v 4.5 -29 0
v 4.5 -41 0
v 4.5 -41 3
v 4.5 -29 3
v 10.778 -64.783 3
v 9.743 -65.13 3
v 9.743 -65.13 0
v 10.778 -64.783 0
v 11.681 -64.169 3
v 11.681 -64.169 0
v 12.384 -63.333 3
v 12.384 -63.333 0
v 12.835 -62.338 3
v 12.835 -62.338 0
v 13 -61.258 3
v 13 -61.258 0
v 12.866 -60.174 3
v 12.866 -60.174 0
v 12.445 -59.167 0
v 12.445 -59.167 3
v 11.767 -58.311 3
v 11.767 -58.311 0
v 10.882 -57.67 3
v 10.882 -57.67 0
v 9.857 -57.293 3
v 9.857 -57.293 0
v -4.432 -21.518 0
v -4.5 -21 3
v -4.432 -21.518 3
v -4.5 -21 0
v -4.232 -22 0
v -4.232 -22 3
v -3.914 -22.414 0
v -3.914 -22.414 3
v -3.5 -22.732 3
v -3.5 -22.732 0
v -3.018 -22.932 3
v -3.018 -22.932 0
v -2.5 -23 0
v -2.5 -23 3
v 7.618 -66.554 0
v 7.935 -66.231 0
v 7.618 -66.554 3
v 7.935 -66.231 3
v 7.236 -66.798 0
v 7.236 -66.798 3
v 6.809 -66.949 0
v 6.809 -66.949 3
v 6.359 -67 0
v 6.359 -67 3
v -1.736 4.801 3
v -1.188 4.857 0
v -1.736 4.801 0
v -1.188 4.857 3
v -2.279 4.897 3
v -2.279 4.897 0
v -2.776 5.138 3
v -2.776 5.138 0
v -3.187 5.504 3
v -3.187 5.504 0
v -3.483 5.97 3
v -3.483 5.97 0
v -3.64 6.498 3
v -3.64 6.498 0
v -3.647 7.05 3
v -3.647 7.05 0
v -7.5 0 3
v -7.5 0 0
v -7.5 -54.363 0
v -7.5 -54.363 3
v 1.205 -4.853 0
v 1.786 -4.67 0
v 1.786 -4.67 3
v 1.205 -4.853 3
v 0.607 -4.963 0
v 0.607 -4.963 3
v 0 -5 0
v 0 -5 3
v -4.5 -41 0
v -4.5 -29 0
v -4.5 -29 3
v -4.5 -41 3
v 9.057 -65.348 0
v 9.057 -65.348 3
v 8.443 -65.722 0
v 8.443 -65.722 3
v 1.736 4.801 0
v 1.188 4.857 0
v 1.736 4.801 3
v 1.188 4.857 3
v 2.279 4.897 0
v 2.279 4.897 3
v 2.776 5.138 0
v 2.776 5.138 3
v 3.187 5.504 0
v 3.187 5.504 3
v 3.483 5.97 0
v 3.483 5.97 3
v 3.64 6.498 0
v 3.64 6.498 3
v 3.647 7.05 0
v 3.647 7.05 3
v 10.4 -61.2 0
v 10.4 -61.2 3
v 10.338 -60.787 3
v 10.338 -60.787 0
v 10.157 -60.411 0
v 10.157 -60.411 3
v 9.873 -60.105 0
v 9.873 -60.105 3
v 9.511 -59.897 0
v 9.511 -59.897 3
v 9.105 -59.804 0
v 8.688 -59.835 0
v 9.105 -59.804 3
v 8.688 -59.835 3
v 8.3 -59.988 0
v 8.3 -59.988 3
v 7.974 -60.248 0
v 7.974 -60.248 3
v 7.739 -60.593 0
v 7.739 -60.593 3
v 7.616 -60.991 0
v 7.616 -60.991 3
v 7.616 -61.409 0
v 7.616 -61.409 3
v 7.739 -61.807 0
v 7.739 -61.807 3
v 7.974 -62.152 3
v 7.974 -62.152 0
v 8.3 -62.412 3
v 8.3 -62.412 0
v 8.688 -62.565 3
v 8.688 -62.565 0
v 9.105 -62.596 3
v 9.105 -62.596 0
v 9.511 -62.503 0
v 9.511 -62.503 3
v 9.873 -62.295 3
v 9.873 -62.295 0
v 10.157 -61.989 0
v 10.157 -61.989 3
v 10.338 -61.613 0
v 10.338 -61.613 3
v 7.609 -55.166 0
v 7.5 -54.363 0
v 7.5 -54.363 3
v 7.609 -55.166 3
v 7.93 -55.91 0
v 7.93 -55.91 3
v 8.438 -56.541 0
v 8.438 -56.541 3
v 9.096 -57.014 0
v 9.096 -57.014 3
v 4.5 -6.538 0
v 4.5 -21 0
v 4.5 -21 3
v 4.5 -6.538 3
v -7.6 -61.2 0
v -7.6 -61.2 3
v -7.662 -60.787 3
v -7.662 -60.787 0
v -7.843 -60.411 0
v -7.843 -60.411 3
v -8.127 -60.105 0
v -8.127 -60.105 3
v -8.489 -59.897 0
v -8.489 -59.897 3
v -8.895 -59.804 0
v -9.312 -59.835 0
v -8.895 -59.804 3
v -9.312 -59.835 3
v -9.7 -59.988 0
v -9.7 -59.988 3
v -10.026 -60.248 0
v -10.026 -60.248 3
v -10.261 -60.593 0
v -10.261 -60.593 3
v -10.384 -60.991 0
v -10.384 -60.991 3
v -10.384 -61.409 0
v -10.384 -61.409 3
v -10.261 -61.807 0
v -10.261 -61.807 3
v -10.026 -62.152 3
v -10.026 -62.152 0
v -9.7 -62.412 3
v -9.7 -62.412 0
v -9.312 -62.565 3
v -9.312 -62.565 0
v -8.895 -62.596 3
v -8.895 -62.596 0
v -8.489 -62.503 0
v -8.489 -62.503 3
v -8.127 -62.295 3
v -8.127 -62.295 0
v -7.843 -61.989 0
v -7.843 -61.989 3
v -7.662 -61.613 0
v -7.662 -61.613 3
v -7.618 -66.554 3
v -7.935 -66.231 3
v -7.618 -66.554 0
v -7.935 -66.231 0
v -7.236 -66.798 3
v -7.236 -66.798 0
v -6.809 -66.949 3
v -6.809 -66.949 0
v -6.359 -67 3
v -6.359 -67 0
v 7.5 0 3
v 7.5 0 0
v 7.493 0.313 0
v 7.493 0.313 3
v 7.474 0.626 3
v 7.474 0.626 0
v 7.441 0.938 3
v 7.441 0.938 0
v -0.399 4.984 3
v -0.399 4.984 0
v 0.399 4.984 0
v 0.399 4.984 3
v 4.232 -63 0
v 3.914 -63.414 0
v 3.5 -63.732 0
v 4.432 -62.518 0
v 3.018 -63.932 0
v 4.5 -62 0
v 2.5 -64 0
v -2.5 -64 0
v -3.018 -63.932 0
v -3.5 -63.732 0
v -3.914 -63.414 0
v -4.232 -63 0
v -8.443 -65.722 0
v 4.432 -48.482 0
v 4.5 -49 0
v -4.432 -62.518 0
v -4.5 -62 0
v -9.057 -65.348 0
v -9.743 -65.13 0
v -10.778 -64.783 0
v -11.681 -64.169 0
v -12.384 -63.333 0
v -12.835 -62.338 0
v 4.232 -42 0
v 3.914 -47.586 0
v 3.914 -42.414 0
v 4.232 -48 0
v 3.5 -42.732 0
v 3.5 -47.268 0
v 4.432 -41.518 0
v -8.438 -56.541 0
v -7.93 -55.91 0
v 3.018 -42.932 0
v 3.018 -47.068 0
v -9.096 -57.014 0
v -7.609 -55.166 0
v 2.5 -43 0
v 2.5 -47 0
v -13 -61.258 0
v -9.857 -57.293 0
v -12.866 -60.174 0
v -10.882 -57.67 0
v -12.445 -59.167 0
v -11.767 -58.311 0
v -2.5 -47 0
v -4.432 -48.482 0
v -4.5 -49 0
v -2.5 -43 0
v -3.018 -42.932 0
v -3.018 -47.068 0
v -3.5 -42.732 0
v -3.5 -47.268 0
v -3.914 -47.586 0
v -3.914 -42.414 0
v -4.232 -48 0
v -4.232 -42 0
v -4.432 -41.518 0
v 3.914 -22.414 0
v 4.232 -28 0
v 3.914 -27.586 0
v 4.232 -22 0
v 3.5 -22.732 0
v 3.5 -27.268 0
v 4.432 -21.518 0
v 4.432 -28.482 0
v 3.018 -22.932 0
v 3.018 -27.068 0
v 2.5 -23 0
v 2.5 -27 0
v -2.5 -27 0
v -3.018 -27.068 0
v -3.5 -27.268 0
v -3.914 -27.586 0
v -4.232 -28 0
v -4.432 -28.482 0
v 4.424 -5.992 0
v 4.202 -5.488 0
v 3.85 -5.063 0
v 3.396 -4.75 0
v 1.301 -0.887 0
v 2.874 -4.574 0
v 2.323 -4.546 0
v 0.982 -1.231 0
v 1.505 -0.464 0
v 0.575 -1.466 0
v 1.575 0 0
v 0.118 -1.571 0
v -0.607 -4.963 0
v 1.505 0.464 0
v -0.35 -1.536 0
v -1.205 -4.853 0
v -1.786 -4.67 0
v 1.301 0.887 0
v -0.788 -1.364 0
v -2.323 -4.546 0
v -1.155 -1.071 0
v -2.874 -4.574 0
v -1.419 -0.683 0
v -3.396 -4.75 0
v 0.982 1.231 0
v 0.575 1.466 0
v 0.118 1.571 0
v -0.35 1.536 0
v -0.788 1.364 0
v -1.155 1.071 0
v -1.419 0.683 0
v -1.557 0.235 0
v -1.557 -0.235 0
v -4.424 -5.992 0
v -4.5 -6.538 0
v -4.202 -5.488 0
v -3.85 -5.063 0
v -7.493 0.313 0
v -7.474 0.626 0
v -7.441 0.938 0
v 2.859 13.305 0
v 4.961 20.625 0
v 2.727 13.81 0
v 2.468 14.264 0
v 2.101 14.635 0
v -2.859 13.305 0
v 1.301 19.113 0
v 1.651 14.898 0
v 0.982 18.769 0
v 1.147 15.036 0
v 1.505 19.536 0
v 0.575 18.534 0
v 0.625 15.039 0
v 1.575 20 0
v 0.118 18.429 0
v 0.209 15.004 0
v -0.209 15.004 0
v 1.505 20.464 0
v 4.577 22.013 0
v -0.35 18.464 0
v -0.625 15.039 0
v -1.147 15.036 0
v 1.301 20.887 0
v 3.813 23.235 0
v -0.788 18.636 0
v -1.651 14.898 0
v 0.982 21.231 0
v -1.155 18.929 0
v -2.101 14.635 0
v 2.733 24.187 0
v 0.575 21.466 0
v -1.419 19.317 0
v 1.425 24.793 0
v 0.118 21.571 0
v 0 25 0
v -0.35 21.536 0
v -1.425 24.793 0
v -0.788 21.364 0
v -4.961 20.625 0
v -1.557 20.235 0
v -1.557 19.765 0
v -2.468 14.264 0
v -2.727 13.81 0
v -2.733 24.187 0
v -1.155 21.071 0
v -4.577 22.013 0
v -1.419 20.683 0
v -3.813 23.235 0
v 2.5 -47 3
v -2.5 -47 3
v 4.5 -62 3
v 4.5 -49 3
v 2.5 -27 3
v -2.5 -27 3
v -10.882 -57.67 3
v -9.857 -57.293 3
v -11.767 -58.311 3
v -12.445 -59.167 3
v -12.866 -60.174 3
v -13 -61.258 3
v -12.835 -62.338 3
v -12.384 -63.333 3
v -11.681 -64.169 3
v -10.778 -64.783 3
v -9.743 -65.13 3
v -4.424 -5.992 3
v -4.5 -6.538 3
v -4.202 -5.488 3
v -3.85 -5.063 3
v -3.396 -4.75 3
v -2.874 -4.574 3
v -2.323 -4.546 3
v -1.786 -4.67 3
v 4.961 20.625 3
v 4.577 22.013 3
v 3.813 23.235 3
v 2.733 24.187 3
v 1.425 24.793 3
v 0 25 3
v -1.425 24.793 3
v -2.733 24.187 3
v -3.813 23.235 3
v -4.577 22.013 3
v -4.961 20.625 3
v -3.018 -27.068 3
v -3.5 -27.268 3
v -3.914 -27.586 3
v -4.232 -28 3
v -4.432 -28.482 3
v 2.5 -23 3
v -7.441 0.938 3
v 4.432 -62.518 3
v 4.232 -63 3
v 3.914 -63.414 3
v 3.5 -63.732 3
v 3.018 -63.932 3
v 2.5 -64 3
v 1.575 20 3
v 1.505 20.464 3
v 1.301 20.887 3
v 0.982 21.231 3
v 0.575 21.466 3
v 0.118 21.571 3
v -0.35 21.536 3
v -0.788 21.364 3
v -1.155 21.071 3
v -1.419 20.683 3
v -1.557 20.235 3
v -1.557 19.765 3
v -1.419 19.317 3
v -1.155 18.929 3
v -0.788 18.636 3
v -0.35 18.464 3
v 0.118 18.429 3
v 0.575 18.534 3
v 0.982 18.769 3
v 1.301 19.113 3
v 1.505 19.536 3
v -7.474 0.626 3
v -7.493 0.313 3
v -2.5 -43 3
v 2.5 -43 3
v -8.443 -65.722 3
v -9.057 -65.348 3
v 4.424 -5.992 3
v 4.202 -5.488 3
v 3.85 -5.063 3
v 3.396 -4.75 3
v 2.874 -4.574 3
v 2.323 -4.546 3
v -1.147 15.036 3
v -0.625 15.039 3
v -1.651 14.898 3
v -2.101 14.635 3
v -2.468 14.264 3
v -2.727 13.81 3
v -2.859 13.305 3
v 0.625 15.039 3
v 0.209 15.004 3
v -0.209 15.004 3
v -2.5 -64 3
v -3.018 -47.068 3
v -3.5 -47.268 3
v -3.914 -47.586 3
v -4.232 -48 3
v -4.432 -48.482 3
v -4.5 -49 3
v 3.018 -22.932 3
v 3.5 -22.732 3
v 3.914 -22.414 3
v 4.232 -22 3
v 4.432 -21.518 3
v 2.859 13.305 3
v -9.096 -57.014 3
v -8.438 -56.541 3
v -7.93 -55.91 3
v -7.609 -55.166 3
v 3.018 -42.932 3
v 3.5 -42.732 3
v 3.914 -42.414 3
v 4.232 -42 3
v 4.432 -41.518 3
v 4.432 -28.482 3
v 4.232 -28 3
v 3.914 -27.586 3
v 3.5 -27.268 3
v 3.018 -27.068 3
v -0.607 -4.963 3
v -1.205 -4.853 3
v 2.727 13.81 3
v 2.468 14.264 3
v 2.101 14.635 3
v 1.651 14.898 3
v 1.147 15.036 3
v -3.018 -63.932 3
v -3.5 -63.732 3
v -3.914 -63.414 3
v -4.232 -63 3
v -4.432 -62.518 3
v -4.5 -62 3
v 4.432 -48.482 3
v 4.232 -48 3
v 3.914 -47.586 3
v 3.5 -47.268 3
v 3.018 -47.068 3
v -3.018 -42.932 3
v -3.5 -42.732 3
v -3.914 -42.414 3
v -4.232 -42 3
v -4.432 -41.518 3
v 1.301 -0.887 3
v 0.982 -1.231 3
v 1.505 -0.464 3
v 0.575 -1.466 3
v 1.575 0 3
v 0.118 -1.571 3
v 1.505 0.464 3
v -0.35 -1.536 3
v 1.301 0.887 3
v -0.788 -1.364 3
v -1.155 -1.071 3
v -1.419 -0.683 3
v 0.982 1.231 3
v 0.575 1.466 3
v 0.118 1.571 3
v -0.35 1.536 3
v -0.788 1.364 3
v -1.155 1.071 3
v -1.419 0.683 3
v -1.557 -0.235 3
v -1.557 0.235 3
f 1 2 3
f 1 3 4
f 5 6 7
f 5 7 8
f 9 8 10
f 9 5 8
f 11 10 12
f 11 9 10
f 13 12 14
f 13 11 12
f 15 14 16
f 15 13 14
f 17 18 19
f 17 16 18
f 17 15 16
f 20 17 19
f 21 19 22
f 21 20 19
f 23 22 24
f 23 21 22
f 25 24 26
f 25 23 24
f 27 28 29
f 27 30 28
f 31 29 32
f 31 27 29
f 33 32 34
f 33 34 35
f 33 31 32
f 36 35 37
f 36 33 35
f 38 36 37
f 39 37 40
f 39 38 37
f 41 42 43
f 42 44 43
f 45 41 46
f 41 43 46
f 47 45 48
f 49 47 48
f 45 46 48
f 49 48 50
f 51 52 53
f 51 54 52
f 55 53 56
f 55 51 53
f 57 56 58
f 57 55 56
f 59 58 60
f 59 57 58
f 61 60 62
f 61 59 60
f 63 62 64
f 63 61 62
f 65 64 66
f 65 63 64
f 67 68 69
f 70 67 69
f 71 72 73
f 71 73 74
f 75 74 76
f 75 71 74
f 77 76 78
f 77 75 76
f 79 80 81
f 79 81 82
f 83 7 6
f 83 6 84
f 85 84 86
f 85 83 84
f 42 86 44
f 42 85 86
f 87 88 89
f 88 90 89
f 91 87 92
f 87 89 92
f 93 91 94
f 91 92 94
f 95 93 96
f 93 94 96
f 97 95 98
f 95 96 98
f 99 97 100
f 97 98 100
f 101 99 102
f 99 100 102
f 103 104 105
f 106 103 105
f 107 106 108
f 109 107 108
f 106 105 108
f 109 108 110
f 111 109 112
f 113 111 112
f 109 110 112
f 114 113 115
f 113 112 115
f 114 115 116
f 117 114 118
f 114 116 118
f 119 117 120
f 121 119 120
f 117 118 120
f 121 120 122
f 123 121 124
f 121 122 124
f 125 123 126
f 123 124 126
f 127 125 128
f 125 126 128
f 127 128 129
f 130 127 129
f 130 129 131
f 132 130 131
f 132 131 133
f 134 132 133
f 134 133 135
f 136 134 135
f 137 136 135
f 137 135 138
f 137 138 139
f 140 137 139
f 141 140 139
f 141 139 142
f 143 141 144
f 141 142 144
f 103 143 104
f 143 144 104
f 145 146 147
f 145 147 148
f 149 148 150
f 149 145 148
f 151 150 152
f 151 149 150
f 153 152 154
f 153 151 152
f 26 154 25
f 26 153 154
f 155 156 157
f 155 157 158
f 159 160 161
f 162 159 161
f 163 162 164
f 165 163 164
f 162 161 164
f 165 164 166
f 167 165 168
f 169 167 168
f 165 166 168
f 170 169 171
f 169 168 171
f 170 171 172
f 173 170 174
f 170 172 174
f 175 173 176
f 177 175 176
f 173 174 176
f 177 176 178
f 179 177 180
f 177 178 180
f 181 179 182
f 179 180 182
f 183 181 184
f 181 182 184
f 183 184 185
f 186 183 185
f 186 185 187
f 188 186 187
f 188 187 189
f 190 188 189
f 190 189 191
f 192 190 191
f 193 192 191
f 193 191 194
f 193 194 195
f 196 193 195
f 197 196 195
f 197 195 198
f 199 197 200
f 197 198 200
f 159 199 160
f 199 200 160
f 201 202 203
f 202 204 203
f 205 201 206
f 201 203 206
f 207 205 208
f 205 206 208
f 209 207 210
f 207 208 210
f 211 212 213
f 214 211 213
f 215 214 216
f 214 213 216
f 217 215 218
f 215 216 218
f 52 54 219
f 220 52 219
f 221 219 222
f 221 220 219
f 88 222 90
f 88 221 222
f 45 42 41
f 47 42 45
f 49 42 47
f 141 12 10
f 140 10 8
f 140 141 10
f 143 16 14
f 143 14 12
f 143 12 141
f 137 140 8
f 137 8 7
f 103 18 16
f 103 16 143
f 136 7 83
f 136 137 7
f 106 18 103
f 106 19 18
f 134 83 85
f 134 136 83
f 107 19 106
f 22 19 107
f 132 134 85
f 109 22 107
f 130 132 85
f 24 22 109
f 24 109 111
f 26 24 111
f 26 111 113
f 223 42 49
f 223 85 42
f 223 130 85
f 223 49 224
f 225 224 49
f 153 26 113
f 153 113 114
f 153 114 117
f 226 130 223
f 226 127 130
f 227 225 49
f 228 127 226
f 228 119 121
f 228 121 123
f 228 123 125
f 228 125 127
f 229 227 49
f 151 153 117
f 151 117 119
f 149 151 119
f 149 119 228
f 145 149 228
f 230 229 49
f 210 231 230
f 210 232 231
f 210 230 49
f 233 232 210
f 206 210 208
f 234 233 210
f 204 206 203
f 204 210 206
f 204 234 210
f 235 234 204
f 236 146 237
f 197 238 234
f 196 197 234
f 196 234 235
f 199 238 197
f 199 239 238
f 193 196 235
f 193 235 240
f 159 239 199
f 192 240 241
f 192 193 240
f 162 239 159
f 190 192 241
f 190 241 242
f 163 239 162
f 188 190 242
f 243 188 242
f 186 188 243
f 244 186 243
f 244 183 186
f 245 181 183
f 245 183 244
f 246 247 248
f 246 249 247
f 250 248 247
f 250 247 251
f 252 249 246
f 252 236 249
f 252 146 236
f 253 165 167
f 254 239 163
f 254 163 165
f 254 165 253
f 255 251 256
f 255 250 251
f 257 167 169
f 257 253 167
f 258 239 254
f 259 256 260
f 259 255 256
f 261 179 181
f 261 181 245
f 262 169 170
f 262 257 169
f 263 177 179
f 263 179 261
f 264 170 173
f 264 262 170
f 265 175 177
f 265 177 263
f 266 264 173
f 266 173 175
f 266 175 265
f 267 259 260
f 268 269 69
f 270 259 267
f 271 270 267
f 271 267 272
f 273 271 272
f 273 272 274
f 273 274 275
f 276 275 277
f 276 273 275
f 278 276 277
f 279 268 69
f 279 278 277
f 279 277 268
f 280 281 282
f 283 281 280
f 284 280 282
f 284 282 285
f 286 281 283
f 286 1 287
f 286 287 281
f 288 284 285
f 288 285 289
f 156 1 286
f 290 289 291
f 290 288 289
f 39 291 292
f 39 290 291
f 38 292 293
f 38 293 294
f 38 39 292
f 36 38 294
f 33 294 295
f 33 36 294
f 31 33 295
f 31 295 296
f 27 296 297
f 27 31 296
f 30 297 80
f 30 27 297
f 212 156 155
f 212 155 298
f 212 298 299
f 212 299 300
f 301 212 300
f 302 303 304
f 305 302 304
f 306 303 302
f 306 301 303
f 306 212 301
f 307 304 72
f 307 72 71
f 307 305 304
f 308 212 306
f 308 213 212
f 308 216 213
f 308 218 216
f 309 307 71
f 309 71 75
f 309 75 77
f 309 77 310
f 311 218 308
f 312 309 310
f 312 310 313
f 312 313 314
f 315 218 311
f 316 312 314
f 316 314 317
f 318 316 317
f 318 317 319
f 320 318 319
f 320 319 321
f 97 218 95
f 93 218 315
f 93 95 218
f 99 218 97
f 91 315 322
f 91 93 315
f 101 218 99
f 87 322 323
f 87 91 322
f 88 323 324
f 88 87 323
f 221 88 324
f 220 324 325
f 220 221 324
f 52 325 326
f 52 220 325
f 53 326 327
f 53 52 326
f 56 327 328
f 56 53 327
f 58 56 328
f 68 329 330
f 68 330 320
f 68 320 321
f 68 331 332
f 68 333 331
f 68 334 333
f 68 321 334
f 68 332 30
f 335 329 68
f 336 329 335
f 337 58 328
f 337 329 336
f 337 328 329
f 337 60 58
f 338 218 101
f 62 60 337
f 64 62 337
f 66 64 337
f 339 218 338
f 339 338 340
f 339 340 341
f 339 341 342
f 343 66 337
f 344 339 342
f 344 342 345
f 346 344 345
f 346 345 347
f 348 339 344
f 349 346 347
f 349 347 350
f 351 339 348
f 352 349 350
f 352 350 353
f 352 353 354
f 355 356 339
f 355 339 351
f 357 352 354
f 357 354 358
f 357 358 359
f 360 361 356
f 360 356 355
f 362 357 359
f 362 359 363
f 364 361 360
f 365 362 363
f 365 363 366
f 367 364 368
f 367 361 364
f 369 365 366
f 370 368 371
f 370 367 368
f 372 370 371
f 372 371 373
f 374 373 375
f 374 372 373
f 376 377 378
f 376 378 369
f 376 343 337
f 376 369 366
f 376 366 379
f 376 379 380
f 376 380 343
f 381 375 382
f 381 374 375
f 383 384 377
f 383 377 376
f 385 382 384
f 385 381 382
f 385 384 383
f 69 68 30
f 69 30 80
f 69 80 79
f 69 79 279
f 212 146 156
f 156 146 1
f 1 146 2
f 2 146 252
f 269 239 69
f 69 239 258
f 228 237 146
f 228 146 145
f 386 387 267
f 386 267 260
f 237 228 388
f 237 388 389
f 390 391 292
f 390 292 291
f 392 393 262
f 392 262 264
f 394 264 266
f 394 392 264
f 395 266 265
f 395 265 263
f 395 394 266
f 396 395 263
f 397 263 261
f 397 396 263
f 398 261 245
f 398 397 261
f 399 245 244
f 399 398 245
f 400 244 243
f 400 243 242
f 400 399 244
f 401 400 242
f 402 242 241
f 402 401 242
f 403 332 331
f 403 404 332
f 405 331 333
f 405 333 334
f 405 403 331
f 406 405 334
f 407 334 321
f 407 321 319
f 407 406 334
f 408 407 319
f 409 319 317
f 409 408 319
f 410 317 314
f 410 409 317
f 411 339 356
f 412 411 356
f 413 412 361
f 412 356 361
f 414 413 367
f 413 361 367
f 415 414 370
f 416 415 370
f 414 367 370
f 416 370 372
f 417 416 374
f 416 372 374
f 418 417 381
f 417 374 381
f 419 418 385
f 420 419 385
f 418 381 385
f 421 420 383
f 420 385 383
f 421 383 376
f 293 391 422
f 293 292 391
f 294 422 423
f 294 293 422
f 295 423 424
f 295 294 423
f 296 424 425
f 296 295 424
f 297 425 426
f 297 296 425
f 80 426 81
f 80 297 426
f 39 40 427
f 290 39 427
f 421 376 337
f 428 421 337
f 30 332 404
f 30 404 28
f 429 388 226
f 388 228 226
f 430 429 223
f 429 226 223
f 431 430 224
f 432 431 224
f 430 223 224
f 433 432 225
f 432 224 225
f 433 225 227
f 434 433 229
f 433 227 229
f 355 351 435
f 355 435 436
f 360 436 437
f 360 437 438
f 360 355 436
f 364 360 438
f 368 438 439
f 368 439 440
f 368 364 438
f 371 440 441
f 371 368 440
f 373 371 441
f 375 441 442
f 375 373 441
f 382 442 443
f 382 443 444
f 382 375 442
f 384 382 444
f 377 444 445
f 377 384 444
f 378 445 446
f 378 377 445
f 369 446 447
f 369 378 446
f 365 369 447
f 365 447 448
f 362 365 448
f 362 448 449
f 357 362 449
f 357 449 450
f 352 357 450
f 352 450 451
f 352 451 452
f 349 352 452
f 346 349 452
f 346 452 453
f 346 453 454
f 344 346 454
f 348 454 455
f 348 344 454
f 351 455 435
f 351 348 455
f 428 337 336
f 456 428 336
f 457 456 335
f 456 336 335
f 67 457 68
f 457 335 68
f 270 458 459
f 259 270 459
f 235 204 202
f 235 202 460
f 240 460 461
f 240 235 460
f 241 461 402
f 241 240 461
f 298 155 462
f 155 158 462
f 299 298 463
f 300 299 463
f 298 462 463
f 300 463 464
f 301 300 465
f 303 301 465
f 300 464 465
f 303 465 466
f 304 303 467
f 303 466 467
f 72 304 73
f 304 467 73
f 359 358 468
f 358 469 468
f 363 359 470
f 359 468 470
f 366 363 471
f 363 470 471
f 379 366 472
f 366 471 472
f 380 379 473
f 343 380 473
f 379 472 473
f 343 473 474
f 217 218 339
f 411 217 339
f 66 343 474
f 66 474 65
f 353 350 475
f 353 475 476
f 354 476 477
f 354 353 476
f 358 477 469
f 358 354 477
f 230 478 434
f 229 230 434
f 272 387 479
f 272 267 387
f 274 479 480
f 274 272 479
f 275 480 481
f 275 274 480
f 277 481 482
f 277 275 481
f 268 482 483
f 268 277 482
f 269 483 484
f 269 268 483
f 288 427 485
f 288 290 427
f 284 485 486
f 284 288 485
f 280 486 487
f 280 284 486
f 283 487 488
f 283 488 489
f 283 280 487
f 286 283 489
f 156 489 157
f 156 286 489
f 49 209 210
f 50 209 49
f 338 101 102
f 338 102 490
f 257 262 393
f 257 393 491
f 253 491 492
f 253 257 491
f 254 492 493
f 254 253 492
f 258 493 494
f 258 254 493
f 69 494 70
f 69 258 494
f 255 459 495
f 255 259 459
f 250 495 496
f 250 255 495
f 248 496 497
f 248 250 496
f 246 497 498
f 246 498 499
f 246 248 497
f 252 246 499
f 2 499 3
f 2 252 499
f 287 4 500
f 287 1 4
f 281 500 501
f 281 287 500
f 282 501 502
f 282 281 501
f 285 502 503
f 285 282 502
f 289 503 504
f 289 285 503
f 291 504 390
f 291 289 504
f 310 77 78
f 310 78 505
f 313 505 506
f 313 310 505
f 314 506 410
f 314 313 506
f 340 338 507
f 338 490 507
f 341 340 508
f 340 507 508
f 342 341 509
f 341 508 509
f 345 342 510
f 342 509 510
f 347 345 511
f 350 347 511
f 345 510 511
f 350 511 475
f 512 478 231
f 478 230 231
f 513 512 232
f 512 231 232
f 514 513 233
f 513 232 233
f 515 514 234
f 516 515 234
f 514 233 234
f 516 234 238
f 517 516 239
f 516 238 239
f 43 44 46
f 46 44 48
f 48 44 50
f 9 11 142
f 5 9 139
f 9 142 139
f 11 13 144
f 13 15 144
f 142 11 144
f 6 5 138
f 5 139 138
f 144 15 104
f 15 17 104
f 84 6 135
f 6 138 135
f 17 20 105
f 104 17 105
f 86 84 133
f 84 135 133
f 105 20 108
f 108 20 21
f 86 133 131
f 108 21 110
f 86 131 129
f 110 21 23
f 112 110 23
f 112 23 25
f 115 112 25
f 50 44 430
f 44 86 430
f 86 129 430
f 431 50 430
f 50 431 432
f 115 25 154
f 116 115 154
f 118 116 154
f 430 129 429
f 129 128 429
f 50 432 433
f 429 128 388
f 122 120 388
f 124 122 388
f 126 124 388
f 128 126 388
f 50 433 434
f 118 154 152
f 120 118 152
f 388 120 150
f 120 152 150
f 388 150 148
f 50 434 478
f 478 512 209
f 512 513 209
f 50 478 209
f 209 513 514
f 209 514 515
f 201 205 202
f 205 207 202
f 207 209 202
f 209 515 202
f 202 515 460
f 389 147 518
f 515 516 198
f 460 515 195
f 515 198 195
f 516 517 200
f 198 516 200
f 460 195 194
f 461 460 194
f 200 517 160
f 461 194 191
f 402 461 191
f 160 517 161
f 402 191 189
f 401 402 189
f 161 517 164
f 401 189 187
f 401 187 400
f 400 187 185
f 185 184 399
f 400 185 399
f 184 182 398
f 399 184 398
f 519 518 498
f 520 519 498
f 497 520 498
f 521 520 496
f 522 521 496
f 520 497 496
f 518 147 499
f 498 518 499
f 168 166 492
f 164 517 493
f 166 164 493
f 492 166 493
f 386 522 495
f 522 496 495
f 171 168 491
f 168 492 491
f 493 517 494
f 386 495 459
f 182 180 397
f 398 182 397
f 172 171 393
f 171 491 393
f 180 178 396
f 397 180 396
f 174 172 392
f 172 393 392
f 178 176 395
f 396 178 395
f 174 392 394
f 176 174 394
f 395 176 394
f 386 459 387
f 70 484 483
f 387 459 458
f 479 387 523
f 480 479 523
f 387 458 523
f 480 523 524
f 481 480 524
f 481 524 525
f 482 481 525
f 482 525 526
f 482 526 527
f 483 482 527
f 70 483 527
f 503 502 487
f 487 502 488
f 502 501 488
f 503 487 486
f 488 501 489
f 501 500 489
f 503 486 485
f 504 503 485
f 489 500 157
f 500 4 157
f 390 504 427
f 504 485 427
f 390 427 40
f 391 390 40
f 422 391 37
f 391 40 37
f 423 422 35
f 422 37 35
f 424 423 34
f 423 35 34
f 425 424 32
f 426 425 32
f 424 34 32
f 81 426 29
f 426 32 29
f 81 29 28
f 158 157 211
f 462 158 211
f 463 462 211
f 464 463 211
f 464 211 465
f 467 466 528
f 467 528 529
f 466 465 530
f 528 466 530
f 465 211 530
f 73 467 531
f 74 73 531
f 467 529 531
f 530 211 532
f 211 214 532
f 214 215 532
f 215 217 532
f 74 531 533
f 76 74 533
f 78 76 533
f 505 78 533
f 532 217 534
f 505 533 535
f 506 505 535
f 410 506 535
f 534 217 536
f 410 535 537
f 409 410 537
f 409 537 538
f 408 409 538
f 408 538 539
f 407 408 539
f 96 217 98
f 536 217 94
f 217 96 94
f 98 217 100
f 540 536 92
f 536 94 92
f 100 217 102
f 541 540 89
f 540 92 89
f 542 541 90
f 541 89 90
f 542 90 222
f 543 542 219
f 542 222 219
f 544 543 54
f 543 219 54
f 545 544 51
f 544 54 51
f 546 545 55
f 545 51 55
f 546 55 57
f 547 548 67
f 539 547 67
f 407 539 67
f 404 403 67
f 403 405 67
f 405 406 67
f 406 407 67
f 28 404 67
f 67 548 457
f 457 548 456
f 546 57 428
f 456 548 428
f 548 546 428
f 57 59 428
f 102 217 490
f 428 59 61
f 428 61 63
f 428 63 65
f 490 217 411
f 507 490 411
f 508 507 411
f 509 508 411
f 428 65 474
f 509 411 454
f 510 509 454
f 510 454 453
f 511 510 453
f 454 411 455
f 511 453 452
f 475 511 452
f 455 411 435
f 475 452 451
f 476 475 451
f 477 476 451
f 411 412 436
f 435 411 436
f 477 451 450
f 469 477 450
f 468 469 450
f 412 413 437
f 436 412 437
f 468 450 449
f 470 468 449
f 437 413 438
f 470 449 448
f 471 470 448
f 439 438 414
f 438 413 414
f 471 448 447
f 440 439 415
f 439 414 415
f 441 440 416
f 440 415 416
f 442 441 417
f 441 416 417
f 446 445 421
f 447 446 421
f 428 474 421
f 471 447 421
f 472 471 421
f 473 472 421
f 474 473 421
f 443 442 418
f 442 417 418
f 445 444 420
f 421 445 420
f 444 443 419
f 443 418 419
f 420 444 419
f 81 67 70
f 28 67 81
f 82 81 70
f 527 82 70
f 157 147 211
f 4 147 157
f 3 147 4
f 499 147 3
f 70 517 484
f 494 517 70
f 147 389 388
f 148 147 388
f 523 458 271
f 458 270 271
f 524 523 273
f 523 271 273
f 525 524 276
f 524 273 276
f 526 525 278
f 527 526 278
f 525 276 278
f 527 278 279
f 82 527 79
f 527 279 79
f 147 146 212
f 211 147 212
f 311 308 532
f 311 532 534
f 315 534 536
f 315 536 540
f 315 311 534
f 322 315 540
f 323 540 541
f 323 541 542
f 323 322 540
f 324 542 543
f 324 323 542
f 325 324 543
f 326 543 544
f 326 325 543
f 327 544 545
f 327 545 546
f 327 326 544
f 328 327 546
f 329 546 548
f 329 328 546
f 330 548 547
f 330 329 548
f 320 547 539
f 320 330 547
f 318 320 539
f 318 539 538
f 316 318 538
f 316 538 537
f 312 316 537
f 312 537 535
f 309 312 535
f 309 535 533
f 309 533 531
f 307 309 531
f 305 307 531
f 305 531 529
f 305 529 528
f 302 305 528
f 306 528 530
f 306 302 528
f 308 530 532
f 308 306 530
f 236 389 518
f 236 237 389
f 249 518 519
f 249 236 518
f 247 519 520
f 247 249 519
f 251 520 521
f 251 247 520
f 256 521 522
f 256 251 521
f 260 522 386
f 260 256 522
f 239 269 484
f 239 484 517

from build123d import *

# Parameters (mm, degrees)
SKETCH_1_R          = 1.575
SKETCH_1_R_2        = 14.5
EXTRUDE_1_DEPTH     = 3
CUT_EXTRUDE_START   = -3
CUT_EXTRUDE_1_DEPTH = 3
SKETCH_3_W          = 9
SKETCH_3_H          = 4
EXTRUDE_2_DEPTH     = 3
SKETCH_4_R          = 4
SKETCH_4_R_2        = 1.4
EXTRUDE_3_DEPTH     = 3
SKETCH_5_W          = 57.078231857
SKETCH_5_H          = 48.607322339
CUT_EXTRUDE_2_DEPTH = 10
SKETCH_6_W          = 9
SKETCH_6_H          = 3
EXTRUDE_4_DEPTH     = 3
FILLET_1_R          = 2
FILLET_2_R          = 3
FILLET_3_R          = 2


with BuildPart() as part:
    # 草图1 → 凸台-拉伸1 (new body)
    with BuildSketch(Plane.XY):
        with BuildLine():
            ThreePointArc((7.5, 0), (7.485279444, 0.469671844), (7.441175562, 0.9375))
            Line((7.441175562, 0.9375), (4.960783708, 20.625))
            ThreePointArc((4.960783708, 20.625), (0, 25), (-4.960783708, 20.625))
            Line((-4.960783708, 20.625), (-7.441175562, 0.9375))
            ThreePointArc((-7.441175562, 0.9375), (-7.485279444, 0.469671844), (-7.5, 0))
            Line((-7.5, 0), (-7.5, -69.31788212))
            ThreePointArc((-7.5, -69.31788212), (0, -112), (7.5, -69.31788212))
            Line((7.5, -69.31788212), (7.5, 0))
        make_face()
        with Locations((-12.374368671, -102.374368671)):
            Circle(SKETCH_1_R, mode=Mode.SUBTRACT)
        with Locations((-12.374368671, -77.625631329)):
            Circle(SKETCH_1_R, mode=Mode.SUBTRACT)
        with Locations((0, -90)):
            Circle(SKETCH_1_R_2, mode=Mode.SUBTRACT)
        with Locations((12.374368671, -102.374368671)):
            Circle(SKETCH_1_R, mode=Mode.SUBTRACT)
        with Locations((12.374368671, -77.625631329)):
            Circle(SKETCH_1_R, mode=Mode.SUBTRACT)
        Circle(SKETCH_1_R, mode=Mode.SUBTRACT)
        with Locations((0, 20)):
            Circle(SKETCH_1_R, mode=Mode.SUBTRACT)
    extrude(amount=EXTRUDE_1_DEPTH)

    # 草图2 → 切除-拉伸1 (cut)
    with BuildSketch(Plane.XY.offset(3).offset(CUT_EXTRUDE_START)):
        with BuildLine():
            Line((0, -68), (0, -5))
            ThreePointArc((0, -5), (-2.655442773, -4.236581603), (-4.5, -2.179449472))
            Line((-4.5, -2.179449472), (-4.5, -68.465144533))
            ThreePointArc((-4.5, -68.465144533), (-2.261988032, -68.116595097), (0, -68))
        make_face()
        with BuildLine():
            ThreePointArc((4.5, -2.179449472), (2.655442773, -4.236581603), (0, -5))
            Line((0, -5), (0, -68))
            ThreePointArc((0, -68), (2.261988032, -68.116595097), (4.5, -68.465144533))
            Line((4.5, -68.465144533), (4.5, -2.179449472))
        make_face()
        with BuildLine():
            Line((-2.557135445, 15.70336663), (-4.192274153, 2.724855487))
            ThreePointArc((-4.192274153, 2.724855487), (0, 5), (4.192274153, 2.724855487))
            Line((4.192274153, 2.724855487), (2.557135445, 15.70336663))
            ThreePointArc((2.557135445, 15.70336663), (0, 15), (-2.557135445, 15.70336663))
        make_face()
    extrude(amount=CUT_EXTRUDE_1_DEPTH, mode=Mode.SUBTRACT)

    # 草图3 → 凸台-拉伸2 (add)
    with BuildSketch(Plane.XY.offset(3)):
        with Locations((0, -45)):
            Rectangle(SKETCH_3_W, SKETCH_3_H)
        with Locations((0, -25)):
            Rectangle(SKETCH_3_W, SKETCH_3_H)
    extrude(amount=-EXTRUDE_2_DEPTH)

    # 草图4 → 凸台-拉伸3 (add)
    # profile 1 of 2: a face of its own
    with BuildSketch(Plane.XY.offset(3)):
        with Locations((-9, -61.2)):
            Circle(SKETCH_4_R)
        with Locations((-9, -61.2)):
            Circle(SKETCH_4_R_2, mode=Mode.SUBTRACT)
    # profile 2 of 2: a face of its own
    with BuildSketch(Plane.XY.offset(3)):
        with Locations((9, -61.2)):
            Circle(SKETCH_4_R)
        with Locations((9, -61.2)):
            Circle(SKETCH_4_R_2, mode=Mode.SUBTRACT)
    extrude(amount=-EXTRUDE_3_DEPTH)

    # 草图5 → 切除-拉伸2 (cut)
    with BuildSketch(Plane.XY.offset(3)):
        with Locations((3.178219729, -91.30366117)):
            Rectangle(SKETCH_5_W, SKETCH_5_H)
    extrude(amount=-CUT_EXTRUDE_2_DEPTH, mode=Mode.SUBTRACT)

    # 草图6 → 凸台-拉伸4 (add)
    with BuildSketch(Plane.XY.offset(3)):
        with Locations((0, -65.5)):
            Rectangle(SKETCH_6_W, SKETCH_6_H)
    extrude(amount=-EXTRUDE_4_DEPTH)

    # 圆角1
    fillet_1_edges = [part.edges().sort_by_distance(p)[0] for p in [
        (-4.5, -27, 1.5),
        (-4.5, -23, 1.5),
        (4.5, -23, 1.5),
        (4.5, -27, 1.5),
        (-2.557135445, 15.70336663, 1.5),
        (2.557135445, 15.70336663, 1.5),
        (4.192274153, 2.724855487, 1.5),
        (-4.192274153, 2.724855487, 1.5),
        (-4.5, -2.179449472, 1.5),
        (4.5, -2.179449472, 1.5),
        (-4.5, -47, 1.5),
        (-4.5, -43, 1.5),
        (4.5, -43, 1.5),
        (4.5, -47, 1.5),
    ]]
    fillet(fillet_1_edges, radius=FILLET_1_R)

    # 圆角2
    # the kernel refuses this fillet: 3 mm, written as the material it adds along each edge
    with BuildSketch(Plane(origin=(-7.5, -64.908099244, 0), x_dir=(0, -1, 0), z_dir=(0, 0, 1))) as fillet_2_piece_1:
        with BuildLine():
            CenterArc((3.170220896, -2.799504541), FILLET_2_R, 111.06581136, 58.235536144)
            Line((0.222369408, -2.242574024), (0.163412378, -2.231435413))
            ThreePointArc((0.163412378, -2.231435413), (0.21267274, -1.11122365), (-0.055621489, -0.0225))
            Line((-0.055621489, -0.0225), (0, 0.06))
            ThreePointArc((0, 0.06), (1.045950378, 0.06), (2.070334354, 0.055990091))
            Line((2.070334354, 0.055990091), (2.091900756, 0))
        make_face()
    extrude(amount=3)
    with BuildSketch(Plane(origin=(-7.5, -57.491900756, 0), x_dir=(0, 1, 0), z_dir=(0, 0, 1))) as fillet_2_piece_2:
        with BuildLine():
            CenterArc((3.129297922, 3), FILLET_2_R, 192.373625116, 77.626374884)
            Line((0.198984851, 2.357142857), (0.14037859, 2.344285714))
            ThreePointArc((0.14037859, 2.344285714), (0.217936404, 1.168572647), (-0.055621489, 0.0225))
            Line((-0.055621489, 0.0225), (0, -0.06))
            Line((0, -0.06), (3.129297922, -0.06))
            Line((3.129297922, -0.06), (3.129297922, 0))
        make_face()
    extrude(amount=3)
    with BuildSketch(Plane(origin=(7.5, -64.908099244, 0), x_dir=(0, -1, 0), z_dir=(0, 0, 1))) as fillet_2_piece_3:
        with BuildLine():
            CenterArc((3.170220896, 2.799504541), FILLET_2_R, 190.698652496, 58.235536144)
            Line((0.222369408, 2.242574024), (0.163412378, 2.231435413))
            ThreePointArc((0.163412378, 2.231435413), (0.21267274, 1.11122365), (-0.055621489, 0.0225))
            Line((-0.055621489, 0.0225), (0, -0.06))
            ThreePointArc((0, -0.06), (1.045950378, -0.06), (2.070334354, -0.055990091))
            Line((2.070334354, -0.055990091), (2.091900756, 0))
        make_face()
    extrude(amount=3)
    with BuildSketch(Plane(origin=(7.5, -57.491900756, 0), x_dir=(0.996455748224994, 0.08411861761445558, 0), z_dir=(0, 0, 1))) as fillet_2_piece_4:
        with BuildLine():
            CenterArc((3.25259946, 2.865851049), FILLET_2_R, 175.17465614, 77.626374884)
            Line((0.263232215, 3.118206902), (0.20344487, 3.123254019))
            Line((0.20344487, 3.123254019), (-0.059787345, 0.005047117))
            Line((-0.059787345, 0.005047117), (0.017741452, -0.057317021))
            ThreePointArc((0.017741452, -0.057317021), (1.18276344, 0.118865267), (2.347785428, -0.057317021))
            Line((2.347785428, -0.057317021), (2.36552688, 0))
        make_face()
    extrude(amount=3)

    # 圆角3
    fillet_3_edges = [part.edges().sort_by_distance(p)[0] for p in [
        (-7.5, -67, 1.5),
        (7.5, -67, 1.5),
        (-4.5, -64, 1.5),
        (4.5, -64, 1.5),
    ]]
    fillet(fillet_3_edges, radius=FILLET_3_R)


solid = part.part
